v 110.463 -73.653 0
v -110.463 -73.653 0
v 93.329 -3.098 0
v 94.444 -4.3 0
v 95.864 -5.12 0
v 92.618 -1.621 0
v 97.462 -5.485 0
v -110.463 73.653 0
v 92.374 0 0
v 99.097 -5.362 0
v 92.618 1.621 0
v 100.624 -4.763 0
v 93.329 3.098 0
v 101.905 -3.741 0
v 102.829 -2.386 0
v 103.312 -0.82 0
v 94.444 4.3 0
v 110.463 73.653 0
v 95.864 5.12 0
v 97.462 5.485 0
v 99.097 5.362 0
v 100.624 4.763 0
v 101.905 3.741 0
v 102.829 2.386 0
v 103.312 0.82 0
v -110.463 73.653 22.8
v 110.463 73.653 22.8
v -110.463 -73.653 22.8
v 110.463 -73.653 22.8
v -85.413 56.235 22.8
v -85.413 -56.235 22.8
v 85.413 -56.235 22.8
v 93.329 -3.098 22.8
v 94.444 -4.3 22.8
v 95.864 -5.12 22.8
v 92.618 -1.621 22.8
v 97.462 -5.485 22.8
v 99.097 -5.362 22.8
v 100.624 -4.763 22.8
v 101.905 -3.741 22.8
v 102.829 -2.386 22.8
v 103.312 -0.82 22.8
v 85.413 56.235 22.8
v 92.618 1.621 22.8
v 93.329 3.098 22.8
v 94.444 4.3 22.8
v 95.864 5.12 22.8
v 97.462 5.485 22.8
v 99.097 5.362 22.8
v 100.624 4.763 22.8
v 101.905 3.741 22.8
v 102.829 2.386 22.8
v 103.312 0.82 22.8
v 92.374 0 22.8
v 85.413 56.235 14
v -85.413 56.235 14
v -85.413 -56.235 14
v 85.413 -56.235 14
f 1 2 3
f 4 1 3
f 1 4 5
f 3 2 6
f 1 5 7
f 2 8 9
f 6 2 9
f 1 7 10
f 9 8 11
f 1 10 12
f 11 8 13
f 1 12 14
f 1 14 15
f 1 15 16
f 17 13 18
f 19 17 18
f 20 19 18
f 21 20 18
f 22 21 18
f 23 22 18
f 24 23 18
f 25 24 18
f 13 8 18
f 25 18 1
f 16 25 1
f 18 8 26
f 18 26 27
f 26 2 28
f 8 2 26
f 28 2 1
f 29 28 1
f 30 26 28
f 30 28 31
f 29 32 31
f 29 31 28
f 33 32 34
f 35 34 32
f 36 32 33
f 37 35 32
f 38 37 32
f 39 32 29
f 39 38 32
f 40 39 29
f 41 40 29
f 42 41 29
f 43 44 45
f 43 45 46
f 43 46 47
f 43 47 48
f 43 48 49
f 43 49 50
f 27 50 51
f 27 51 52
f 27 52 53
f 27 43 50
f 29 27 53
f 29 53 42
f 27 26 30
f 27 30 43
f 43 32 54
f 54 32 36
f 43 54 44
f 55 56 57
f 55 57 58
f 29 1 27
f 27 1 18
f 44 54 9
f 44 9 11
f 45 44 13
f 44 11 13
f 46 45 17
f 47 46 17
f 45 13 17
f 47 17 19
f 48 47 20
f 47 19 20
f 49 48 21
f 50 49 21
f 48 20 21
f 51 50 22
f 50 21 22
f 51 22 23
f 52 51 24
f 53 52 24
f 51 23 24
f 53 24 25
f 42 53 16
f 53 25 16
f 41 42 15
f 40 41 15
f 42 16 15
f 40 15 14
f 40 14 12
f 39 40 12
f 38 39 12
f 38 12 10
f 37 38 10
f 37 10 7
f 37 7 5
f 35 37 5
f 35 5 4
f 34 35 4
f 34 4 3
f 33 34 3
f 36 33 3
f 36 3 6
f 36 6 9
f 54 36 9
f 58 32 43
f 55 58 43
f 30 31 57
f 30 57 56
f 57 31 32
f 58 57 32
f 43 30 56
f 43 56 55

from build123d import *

# Parameters (mm, degrees)
F0_W     = 220.925912261
F0_H     = 147.3058909178
F1_DEPTH = 22.8
F2_W     = 170.8267480135
F2_H     = 112.4693089873
F3_DEPTH = 8.8
F5_D     = 11


with BuildPart() as f1:
    # F0 (on Top) → F1 (new body)
    with BuildSketch(Plane.XY):
        Rectangle(F0_W, F0_H)
    extrude(amount=F1_DEPTH)

    # F2 (on face) → F3 (cut)
    with BuildSketch(Plane.XY.offset(22.8)):
        Rectangle(F2_W, F2_H)
    extrude(amount=-F3_DEPTH, mode=Mode.SUBTRACT)

    # F5 (through all)
    with Locations(Plane.XY.offset(22.8)):
        with Locations((97.8735089302, 0)):
            Hole(F5_D / 2)


solid = f1.part
